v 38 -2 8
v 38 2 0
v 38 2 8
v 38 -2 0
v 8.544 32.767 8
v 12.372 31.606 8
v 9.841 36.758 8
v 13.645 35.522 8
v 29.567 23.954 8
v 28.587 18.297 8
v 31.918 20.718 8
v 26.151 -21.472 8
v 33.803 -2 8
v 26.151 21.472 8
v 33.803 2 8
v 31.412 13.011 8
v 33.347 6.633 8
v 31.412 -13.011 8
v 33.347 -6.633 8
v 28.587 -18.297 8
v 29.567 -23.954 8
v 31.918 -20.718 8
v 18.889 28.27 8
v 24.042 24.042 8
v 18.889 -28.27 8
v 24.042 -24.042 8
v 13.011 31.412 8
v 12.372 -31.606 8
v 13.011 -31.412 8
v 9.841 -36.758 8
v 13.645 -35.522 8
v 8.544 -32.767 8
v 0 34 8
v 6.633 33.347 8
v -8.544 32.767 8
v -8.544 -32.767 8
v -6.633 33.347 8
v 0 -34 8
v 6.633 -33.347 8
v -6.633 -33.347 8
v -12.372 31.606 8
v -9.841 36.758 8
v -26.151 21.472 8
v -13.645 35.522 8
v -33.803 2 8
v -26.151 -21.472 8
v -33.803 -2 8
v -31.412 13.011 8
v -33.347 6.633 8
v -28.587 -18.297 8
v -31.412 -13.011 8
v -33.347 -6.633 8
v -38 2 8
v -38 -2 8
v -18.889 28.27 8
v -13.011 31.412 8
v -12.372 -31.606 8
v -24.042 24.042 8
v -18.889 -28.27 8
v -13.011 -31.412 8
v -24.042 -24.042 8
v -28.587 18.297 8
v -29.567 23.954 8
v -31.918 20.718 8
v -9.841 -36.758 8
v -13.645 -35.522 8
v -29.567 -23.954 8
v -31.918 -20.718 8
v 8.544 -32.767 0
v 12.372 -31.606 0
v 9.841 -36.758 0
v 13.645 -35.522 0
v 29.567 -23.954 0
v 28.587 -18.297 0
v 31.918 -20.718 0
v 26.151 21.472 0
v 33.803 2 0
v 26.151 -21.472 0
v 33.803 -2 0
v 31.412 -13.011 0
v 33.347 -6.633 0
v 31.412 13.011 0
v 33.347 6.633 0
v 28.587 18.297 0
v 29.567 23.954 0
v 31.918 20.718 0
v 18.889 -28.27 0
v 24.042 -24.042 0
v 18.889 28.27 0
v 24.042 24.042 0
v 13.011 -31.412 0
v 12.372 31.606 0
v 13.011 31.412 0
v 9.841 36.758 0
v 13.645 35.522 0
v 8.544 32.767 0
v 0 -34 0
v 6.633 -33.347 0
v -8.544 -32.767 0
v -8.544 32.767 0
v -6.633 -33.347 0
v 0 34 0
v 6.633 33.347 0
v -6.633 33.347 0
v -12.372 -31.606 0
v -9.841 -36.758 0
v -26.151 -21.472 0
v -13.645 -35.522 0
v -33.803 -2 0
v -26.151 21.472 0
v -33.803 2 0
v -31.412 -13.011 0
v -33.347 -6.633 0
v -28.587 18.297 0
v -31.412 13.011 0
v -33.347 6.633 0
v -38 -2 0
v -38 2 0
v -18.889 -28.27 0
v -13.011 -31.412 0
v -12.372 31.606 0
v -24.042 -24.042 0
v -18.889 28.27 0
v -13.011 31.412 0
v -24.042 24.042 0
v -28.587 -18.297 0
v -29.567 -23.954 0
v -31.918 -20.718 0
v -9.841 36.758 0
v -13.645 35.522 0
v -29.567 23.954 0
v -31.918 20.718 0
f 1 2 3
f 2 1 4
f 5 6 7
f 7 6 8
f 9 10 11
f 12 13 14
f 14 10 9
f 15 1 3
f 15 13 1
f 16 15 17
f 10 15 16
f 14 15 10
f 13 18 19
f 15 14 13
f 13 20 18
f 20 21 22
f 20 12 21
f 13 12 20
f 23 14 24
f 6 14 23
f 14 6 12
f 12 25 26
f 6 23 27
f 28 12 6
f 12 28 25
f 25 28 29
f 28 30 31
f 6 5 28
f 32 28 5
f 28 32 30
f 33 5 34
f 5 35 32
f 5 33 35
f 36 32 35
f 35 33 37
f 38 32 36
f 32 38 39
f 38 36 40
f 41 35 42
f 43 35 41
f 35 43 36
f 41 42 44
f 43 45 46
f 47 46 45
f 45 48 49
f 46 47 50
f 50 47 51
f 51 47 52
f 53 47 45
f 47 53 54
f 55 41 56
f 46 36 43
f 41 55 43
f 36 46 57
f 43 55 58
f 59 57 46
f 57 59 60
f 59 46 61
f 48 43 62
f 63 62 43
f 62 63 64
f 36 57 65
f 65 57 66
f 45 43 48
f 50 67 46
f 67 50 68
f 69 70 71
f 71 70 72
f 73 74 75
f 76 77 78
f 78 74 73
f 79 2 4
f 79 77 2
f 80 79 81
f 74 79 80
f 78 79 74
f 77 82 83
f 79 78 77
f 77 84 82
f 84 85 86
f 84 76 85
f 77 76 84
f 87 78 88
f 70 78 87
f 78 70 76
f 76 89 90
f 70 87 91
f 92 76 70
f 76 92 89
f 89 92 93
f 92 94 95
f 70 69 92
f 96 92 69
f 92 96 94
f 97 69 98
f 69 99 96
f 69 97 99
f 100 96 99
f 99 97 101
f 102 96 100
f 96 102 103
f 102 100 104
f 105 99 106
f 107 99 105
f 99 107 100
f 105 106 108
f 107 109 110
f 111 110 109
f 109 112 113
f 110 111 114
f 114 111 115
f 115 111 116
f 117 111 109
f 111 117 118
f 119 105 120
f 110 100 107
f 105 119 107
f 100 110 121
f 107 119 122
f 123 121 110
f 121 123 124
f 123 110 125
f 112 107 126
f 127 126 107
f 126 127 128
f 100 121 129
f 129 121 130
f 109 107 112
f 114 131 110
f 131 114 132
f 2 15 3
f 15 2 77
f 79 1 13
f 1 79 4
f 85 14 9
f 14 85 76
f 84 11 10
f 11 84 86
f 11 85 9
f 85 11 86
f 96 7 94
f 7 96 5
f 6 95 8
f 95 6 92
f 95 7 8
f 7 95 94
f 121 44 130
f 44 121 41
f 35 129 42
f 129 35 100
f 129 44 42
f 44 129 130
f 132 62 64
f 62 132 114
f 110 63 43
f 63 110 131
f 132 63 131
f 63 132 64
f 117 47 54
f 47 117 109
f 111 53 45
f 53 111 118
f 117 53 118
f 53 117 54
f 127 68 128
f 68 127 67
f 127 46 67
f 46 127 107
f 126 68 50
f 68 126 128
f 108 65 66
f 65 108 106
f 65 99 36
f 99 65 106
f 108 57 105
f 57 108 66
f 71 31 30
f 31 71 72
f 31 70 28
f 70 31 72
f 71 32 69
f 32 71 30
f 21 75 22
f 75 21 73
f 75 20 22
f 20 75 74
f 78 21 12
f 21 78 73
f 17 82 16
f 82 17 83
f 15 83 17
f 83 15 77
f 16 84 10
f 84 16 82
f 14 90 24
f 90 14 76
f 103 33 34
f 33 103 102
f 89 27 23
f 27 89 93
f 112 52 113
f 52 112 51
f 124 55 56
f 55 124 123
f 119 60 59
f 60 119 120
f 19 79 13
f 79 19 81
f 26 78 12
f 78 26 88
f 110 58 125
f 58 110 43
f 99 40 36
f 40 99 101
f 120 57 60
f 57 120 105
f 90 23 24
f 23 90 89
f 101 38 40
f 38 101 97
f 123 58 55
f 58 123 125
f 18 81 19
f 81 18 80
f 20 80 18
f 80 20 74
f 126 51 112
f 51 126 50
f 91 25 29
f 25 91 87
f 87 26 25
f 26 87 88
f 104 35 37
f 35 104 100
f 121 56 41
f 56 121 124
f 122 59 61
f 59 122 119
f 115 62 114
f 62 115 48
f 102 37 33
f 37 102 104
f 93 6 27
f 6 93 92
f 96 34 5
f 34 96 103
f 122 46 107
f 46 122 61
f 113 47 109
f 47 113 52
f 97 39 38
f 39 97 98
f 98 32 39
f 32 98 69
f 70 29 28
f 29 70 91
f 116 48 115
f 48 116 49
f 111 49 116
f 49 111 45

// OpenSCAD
$fn = 32;

// ----------------------------------------------------------------------
// Spur blank: plain gear blank
// ----------------------------------------------------------------------

// --- parameters (mm) ---
disc_r = 34;              // blank root radius
disc_t = 8;               // blank thickness
n_teeth = 10;             // stub tooth count
tooth_w = 4;              // tooth width at the root
tooth_h = 4;              // tooth height above the root

out_r = disc_r + tooth_h;  // tip radius
bbox_x = 76.0;  // measured width over the teeth
bbox_y = 73.52;  // measured depth over the teeth

union() {
  cylinder(r = disc_r, h = disc_t);
  for (i = [0 : n_teeth - 1])
    rotate([0, 0, i * 360 / n_teeth])
      translate([disc_r - 1, -tooth_w / 2, 0])
        cube([tooth_h + 1, tooth_w, disc_t]);
}
